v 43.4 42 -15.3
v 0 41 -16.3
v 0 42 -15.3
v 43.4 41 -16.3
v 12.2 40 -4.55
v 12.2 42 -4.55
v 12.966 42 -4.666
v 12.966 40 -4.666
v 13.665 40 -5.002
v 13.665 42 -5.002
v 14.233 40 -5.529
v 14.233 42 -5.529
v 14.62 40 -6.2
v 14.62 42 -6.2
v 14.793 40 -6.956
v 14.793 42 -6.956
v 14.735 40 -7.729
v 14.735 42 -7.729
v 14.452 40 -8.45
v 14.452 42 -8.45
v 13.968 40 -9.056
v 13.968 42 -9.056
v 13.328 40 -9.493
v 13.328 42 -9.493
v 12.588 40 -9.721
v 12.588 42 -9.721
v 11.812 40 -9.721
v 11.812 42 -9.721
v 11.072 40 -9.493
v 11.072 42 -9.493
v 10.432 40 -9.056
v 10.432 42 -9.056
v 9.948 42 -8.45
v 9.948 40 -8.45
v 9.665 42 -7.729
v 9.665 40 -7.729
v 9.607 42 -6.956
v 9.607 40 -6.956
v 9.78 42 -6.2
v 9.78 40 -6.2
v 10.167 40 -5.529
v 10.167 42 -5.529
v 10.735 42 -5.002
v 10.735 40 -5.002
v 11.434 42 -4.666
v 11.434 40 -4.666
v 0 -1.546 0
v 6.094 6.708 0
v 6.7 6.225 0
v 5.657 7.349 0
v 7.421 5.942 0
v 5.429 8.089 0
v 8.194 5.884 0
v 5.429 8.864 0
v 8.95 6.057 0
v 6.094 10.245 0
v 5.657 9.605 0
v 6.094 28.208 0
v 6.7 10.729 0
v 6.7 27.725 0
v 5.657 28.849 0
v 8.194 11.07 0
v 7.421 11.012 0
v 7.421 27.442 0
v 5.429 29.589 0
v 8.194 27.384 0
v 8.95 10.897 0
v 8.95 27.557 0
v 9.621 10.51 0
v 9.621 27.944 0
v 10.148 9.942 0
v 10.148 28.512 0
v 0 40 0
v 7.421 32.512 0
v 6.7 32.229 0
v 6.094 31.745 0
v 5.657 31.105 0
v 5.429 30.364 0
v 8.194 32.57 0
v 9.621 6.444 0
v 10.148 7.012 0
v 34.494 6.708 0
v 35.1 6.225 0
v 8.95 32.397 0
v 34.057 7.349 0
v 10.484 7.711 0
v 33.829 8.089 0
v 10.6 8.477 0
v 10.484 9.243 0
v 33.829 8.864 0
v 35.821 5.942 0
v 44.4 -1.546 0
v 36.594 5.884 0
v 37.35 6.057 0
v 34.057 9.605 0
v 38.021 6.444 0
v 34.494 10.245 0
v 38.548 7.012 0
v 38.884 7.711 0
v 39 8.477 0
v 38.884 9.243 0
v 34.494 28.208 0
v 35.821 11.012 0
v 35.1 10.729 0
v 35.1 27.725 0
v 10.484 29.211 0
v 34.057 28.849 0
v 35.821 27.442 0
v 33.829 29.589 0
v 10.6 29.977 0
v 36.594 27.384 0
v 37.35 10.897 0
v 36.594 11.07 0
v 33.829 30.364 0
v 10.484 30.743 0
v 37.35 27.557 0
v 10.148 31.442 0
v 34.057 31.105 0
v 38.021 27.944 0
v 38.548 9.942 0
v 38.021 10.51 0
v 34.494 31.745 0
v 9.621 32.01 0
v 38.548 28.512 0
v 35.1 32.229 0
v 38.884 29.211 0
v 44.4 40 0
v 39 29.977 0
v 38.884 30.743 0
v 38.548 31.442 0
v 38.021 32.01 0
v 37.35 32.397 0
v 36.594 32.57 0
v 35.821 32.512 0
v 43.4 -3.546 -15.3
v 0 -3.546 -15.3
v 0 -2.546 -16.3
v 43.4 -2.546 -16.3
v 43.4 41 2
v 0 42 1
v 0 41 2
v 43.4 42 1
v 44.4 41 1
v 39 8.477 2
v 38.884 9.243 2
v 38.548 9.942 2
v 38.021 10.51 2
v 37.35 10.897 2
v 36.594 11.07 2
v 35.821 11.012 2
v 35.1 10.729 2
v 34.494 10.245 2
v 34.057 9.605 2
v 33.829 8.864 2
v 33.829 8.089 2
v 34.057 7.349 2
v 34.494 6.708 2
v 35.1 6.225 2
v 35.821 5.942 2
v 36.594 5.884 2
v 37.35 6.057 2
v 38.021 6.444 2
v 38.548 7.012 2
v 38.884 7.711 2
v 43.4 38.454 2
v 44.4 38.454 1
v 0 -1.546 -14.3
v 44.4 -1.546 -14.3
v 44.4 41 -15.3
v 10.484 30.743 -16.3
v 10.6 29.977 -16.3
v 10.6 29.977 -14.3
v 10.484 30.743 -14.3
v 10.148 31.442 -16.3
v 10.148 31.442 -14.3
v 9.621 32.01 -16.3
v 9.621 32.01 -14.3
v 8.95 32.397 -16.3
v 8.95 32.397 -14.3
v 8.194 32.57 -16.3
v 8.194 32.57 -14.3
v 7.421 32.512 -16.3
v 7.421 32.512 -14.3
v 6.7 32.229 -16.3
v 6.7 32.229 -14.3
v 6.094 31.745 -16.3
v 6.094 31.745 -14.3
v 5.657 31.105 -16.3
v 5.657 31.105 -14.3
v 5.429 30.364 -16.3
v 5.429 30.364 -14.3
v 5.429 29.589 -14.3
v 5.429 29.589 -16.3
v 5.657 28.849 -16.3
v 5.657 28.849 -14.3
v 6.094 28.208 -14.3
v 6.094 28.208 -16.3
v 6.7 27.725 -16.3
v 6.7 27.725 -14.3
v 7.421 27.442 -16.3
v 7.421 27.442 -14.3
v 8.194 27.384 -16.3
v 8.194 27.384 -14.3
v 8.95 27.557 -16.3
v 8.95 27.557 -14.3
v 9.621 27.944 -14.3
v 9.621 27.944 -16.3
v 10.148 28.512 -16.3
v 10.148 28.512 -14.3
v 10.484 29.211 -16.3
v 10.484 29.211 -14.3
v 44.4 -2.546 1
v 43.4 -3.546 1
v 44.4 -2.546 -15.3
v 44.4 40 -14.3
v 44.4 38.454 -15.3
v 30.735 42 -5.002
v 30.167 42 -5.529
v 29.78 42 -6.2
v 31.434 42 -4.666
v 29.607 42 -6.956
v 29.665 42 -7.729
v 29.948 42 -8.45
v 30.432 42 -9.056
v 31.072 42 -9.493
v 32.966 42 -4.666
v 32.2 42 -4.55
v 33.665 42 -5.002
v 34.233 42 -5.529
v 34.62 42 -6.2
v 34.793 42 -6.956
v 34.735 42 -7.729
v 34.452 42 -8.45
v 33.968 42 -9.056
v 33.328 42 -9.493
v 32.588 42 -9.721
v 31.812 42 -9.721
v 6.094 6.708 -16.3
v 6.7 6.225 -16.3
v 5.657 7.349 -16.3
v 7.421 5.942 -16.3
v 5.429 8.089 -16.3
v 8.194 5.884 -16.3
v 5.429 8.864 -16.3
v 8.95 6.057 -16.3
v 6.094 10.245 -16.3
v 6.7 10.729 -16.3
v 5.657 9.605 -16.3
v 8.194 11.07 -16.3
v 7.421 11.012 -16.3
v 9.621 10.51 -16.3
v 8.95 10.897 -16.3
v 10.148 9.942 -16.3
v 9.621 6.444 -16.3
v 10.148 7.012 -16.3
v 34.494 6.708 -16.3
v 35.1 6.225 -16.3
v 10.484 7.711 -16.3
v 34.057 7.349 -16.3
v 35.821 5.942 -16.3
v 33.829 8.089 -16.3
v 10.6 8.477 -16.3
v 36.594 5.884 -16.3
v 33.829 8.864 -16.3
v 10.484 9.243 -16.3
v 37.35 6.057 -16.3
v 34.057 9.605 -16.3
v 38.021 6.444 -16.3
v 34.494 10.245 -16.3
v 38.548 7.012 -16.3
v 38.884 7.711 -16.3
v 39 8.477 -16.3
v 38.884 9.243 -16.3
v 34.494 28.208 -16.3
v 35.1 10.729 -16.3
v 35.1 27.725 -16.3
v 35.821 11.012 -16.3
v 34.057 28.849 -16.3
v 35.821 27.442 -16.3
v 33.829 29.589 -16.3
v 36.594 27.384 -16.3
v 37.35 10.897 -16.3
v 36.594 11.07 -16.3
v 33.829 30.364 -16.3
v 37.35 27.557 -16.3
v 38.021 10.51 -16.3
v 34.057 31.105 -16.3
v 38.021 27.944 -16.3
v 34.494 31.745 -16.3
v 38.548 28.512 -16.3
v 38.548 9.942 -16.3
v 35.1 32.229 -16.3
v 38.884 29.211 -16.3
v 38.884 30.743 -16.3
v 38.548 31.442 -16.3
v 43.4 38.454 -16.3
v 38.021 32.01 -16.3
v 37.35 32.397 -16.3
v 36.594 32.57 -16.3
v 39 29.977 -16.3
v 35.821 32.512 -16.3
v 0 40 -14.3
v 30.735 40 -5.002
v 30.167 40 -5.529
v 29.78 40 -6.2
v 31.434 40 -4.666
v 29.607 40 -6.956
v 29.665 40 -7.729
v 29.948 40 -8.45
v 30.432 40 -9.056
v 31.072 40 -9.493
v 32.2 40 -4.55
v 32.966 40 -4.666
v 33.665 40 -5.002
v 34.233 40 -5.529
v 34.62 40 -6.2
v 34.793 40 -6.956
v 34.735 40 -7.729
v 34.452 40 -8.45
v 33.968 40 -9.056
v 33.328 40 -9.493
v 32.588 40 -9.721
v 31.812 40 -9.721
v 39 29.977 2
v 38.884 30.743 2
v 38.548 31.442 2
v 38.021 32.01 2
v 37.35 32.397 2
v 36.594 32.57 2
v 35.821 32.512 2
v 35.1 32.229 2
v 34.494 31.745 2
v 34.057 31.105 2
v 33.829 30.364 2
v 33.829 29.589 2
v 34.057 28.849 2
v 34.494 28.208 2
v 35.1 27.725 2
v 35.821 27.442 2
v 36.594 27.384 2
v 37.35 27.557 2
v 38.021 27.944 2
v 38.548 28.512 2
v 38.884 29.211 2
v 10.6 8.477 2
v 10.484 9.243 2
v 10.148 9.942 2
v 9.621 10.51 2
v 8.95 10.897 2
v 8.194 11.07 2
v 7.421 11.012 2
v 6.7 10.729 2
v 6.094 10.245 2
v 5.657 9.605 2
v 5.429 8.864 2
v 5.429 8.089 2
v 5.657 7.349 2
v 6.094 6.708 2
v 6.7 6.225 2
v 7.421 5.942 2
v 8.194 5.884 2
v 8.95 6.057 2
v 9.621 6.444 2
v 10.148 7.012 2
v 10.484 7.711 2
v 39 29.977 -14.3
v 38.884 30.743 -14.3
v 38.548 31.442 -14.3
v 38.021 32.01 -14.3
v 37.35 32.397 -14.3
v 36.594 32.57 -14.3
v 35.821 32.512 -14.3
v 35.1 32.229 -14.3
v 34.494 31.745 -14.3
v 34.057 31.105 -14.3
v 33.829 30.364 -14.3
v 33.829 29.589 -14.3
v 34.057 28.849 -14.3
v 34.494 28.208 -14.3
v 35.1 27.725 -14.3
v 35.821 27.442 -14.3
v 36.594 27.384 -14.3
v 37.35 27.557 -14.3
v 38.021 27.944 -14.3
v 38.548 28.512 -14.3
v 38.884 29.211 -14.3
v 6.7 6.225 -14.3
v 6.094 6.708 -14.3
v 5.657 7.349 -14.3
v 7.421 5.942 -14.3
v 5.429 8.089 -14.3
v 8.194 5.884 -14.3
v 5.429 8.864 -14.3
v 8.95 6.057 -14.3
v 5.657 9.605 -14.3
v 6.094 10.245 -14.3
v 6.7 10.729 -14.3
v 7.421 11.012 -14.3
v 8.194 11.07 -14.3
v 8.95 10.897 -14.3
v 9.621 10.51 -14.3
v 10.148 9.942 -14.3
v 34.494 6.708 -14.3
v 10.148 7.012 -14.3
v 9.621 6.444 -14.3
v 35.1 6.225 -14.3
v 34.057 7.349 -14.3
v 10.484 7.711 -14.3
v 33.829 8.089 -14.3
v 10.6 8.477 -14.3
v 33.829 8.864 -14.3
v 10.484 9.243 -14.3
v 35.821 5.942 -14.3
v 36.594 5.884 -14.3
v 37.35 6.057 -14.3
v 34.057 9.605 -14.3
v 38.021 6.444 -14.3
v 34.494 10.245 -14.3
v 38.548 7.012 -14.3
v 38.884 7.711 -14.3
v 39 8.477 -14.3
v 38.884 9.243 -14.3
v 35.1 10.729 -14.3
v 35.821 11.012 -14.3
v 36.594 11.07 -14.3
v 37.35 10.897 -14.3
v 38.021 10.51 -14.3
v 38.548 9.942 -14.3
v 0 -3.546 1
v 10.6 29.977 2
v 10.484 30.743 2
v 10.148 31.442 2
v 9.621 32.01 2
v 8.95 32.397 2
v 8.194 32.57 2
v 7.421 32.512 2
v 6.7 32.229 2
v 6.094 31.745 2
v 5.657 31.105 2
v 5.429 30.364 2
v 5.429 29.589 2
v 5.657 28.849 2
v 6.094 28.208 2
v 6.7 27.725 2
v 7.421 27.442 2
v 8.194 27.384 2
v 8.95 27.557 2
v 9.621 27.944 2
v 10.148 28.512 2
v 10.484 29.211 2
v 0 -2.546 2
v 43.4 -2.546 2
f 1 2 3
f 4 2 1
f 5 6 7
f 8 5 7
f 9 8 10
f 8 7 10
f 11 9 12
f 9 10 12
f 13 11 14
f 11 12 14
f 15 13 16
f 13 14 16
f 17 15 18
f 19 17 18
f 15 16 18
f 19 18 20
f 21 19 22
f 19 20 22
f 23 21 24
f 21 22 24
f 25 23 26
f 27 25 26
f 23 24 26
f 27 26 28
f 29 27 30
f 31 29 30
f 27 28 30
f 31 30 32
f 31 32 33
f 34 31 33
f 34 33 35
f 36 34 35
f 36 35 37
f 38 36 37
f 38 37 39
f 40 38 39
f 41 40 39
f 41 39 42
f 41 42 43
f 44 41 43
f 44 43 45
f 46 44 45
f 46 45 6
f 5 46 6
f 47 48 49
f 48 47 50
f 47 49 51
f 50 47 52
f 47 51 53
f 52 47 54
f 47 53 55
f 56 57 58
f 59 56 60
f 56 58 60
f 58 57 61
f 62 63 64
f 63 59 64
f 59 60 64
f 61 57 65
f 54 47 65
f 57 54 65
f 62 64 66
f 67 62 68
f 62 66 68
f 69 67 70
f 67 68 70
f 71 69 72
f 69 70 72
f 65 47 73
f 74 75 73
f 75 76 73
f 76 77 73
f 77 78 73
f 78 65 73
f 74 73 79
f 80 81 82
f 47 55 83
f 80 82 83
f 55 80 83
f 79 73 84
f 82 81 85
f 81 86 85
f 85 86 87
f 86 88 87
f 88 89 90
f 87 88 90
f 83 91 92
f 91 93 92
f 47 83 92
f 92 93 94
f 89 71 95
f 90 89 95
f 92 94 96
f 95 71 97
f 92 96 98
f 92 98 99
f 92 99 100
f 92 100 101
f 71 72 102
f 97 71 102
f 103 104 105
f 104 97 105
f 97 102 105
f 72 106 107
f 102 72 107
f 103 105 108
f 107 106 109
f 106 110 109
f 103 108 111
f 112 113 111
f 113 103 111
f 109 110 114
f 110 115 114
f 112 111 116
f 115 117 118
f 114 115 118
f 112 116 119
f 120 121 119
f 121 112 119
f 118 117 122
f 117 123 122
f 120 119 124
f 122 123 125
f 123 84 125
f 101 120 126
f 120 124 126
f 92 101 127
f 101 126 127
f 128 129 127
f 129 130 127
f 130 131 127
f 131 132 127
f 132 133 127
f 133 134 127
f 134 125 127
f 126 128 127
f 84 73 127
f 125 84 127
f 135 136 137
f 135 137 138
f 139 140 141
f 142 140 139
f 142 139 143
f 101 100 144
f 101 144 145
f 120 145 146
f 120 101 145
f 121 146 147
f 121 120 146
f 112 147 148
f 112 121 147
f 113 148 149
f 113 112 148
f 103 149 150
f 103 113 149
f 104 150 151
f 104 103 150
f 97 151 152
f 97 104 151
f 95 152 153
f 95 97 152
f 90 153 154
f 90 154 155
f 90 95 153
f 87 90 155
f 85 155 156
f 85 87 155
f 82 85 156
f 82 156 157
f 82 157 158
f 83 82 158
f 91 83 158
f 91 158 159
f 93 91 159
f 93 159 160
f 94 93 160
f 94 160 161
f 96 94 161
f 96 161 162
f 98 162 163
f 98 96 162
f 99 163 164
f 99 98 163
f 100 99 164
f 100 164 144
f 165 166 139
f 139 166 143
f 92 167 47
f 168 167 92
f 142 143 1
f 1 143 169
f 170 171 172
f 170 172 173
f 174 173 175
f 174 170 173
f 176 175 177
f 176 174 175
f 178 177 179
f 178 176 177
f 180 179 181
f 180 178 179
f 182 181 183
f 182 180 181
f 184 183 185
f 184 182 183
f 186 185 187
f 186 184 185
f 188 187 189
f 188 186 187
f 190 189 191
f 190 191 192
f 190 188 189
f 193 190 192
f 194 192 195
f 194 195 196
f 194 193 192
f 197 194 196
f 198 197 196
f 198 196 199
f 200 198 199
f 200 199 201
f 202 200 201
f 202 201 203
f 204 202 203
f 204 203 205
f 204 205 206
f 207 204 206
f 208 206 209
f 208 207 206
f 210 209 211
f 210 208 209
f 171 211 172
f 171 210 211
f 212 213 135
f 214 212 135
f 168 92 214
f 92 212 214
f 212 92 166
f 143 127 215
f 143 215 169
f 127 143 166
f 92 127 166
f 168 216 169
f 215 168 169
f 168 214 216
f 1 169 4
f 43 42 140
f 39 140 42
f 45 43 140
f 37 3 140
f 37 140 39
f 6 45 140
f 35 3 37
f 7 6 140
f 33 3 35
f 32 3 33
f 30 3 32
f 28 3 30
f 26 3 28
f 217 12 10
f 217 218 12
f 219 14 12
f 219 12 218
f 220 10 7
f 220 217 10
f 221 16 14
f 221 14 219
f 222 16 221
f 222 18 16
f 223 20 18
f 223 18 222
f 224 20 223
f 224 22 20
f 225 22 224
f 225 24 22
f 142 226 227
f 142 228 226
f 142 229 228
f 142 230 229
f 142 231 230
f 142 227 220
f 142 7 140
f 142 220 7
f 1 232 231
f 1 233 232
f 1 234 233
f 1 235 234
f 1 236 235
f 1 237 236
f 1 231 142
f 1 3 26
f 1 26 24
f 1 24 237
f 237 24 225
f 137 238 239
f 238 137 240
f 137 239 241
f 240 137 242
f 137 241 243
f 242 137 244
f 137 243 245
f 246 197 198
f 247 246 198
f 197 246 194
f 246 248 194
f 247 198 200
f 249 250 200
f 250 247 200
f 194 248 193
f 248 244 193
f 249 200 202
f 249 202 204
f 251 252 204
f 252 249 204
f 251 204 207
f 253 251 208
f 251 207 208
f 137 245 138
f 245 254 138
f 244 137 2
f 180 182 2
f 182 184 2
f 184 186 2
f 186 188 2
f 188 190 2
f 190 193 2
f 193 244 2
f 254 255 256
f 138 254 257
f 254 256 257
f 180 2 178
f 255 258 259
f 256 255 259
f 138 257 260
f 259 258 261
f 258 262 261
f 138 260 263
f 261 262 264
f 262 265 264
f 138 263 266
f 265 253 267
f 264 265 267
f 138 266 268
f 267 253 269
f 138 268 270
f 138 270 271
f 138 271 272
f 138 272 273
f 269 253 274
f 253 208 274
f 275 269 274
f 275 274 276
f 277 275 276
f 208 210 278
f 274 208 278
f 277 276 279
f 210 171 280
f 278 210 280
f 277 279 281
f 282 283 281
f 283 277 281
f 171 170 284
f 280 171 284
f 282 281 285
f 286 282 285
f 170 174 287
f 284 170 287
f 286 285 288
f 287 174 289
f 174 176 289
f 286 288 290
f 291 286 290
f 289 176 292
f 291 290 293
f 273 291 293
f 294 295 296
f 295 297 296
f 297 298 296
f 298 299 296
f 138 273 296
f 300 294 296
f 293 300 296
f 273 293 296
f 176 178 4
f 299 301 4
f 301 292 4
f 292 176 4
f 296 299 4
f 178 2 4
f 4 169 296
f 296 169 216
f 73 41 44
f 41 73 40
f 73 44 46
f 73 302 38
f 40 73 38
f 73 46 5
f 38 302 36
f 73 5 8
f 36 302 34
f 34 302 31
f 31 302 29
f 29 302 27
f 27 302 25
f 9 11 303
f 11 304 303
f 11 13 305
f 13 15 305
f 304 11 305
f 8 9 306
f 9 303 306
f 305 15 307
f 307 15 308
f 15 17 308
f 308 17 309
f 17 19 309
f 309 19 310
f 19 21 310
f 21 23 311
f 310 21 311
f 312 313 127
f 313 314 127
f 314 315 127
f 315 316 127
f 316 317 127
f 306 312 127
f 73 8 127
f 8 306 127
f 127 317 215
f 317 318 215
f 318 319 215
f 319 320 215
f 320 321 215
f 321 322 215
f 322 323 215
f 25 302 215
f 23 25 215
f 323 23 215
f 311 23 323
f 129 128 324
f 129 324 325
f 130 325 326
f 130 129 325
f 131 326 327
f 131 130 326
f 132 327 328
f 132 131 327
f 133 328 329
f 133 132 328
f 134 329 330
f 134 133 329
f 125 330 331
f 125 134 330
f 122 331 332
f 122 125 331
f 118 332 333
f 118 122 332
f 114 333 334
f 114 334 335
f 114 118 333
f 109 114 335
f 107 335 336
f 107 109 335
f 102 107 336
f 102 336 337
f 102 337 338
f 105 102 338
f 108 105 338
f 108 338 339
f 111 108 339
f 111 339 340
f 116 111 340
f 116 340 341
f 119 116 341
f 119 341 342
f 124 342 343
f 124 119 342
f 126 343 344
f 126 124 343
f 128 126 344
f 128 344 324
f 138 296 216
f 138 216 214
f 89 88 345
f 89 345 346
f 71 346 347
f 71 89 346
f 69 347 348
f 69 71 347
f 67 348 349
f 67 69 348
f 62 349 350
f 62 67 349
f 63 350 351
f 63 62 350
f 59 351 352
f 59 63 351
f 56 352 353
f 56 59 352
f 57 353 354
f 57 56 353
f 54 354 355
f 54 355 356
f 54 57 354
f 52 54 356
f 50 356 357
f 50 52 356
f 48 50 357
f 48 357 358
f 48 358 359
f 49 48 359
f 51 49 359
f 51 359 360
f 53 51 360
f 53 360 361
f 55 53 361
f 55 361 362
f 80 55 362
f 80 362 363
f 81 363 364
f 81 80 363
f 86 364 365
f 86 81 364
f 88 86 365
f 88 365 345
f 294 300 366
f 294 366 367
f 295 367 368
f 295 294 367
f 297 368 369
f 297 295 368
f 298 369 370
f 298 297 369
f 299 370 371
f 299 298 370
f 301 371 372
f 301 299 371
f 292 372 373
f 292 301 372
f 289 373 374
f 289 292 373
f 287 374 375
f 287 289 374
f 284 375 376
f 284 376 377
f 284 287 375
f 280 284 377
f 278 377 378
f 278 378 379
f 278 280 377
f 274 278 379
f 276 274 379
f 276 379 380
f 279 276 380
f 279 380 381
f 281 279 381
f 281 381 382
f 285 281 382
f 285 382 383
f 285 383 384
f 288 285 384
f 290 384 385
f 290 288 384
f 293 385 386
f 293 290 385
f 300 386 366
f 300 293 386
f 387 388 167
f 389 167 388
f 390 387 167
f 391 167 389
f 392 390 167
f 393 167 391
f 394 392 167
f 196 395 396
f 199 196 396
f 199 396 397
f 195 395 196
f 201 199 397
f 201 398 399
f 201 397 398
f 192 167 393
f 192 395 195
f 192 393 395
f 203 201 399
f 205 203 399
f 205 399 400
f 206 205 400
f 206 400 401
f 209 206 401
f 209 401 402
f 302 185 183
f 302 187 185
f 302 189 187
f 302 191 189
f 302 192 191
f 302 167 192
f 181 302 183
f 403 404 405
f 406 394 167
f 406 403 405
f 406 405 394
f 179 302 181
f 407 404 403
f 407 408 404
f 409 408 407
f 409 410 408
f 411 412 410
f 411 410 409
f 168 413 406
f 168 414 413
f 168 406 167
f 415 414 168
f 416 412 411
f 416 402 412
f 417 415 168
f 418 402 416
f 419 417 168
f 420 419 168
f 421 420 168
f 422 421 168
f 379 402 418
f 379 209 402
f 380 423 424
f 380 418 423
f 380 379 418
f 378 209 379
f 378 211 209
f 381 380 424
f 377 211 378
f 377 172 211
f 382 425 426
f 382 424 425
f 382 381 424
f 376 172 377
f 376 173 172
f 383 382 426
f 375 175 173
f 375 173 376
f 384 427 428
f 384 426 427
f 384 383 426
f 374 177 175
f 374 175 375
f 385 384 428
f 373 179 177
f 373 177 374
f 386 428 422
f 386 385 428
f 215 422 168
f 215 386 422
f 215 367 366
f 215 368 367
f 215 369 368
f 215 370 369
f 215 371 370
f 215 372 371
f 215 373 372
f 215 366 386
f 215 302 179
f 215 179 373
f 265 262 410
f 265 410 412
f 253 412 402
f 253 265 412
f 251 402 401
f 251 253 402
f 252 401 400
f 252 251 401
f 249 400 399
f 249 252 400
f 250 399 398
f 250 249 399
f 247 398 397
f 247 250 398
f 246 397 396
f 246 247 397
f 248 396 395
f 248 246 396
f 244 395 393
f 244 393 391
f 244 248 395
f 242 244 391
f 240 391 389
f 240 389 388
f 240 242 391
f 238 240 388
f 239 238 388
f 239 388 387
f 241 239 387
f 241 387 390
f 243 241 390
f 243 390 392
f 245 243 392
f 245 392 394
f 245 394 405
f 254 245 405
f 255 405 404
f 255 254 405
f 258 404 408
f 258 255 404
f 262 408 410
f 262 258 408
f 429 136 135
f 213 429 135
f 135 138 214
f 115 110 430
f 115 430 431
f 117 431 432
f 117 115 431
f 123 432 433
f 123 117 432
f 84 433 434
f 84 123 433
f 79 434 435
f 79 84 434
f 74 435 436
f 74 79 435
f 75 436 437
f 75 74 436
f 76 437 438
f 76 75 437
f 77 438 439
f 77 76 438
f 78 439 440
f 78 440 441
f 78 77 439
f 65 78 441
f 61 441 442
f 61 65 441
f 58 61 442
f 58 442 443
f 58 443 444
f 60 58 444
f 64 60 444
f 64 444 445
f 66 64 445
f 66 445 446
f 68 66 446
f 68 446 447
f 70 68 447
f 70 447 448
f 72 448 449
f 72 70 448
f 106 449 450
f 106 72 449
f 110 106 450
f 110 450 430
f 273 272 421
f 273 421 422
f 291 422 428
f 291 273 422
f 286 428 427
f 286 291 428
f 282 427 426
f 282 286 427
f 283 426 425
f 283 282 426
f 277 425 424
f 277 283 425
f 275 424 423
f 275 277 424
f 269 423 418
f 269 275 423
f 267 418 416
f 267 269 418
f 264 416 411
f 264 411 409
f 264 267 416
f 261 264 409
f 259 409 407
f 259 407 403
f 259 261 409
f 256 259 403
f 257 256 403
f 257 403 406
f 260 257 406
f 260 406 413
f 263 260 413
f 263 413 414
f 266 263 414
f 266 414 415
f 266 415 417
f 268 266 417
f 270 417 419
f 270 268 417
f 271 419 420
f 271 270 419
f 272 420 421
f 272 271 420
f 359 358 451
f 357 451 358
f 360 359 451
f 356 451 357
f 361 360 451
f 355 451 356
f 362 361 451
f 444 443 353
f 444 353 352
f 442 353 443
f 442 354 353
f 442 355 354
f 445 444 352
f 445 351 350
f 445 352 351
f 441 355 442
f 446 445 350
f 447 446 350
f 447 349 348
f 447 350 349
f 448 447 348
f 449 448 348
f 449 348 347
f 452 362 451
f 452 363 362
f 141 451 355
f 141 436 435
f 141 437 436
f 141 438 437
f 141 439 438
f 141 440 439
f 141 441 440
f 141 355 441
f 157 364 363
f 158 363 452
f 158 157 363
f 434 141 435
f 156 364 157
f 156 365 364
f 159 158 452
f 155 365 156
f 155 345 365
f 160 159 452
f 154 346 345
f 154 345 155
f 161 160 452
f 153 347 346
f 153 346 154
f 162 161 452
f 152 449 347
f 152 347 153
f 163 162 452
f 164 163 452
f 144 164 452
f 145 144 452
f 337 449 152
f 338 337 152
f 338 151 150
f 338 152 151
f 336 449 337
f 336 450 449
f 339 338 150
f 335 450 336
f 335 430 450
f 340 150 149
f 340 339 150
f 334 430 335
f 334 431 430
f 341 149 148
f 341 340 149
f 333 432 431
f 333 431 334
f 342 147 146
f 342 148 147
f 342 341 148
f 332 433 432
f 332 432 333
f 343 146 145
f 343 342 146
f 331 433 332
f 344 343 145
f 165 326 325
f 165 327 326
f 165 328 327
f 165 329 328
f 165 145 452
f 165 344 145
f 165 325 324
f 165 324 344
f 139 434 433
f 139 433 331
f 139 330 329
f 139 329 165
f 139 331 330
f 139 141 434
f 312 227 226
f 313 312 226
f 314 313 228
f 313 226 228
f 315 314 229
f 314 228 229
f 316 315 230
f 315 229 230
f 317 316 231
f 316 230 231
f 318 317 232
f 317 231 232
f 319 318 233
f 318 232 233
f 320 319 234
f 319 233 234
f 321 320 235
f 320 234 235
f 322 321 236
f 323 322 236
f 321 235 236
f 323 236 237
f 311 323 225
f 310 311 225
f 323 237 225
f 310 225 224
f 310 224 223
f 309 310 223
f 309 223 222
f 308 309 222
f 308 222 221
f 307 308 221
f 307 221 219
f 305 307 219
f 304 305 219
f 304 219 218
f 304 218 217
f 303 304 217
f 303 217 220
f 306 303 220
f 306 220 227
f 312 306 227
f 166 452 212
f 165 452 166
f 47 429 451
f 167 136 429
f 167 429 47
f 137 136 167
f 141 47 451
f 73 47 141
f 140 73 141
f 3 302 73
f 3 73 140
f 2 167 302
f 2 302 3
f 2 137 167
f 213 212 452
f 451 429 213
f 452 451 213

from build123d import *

# Parameters (mm, degrees)
SKETCH1_W               = 44.4
SKETCH1_H               = 40
SKETCH1_R               = 2.6
BOSS_EXTRUDE1_DEPTH     = 2
SKETCH2_W               = 44.4
SKETCH2_H               = 18.3
BOSS_EXTRUDE2_DEPTH     = 2
LPATTERN1_COUNT         = 2
LPATTERN1_PITCH         = 16.3
SKETCH3_R               = 2.6
CUT_EXTRUDE1_DEPTH      = 64.253853638
CHAMFER1_SIZE           = 1
MIRROR1_COPY_1_SKETCH_W = 44.4
MIRROR1_COPY_1_SKETCH_H = 40
MIRROR1_COPY_1_SKETCH_R = 2.6
MIRROR1_COPY_1_DEPTH    = 2
CHAMFER3_SIZE           = 1


with BuildPart() as part:
    # Sketch1 → Boss-Extrude1 (new body)
    with BuildSketch(Plane.XY):
        with Locations((22.2, 20)):
            Rectangle(SKETCH1_W, SKETCH1_H)
        with Locations((8, 8.476902454)):
            Circle(SKETCH1_R, mode=Mode.SUBTRACT)
        with Locations((8, 29.976902454)):
            Circle(SKETCH1_R, mode=Mode.SUBTRACT)
        with Locations((36.4, 29.976902454)):
            Circle(SKETCH1_R, mode=Mode.SUBTRACT)
        with Locations((36.4, 8.476902454)):
            Circle(SKETCH1_R, mode=Mode.SUBTRACT)
    boss_extrude1 = extrude(amount=BOSS_EXTRUDE1_DEPTH)

    # Sketch2 → Boss-Extrude2 (add)
    with BuildSketch(Plane(origin=(0, 40, 0), x_dir=(1, 0, 0), z_dir=(0, 1, 0))):
        with Locations((22.2, 7.15)):
            Rectangle(SKETCH2_W, SKETCH2_H)
    boss_extrude2 = extrude(amount=BOSS_EXTRUDE2_DEPTH)

    # LPattern1: Boss-Extrude1 ×2
    with Locations(*[(0, 0, -i * LPATTERN1_PITCH) for i in range(1, LPATTERN1_COUNT)]):
        add(boss_extrude1)

    # Sketch3 → Cut-Extrude1 (cut, through all)
    with BuildSketch(Plane(origin=(0, 42, 0), x_dir=(1, 0, 0), z_dir=(0, 1, 0))):
        with Locations(Location((12.2, 7.15, 0), (0, 0, 270))):
            Circle(SKETCH3_R)
        with Locations(Location((32.2, 7.15, 0), (0, 0, 270))):
            Circle(SKETCH3_R)
    extrude(amount=-CUT_EXTRUDE1_DEPTH, mode=Mode.SUBTRACT)

    # Chamfer1
    chamfer1_edges = [part.edges().sort_by_distance(p)[0] for p in [
        (44.4, 21, 2),
        (44.4, 21, -16.3),
        (22.2, 42, 2),
        (44.4, 42, -7.15),
        (22.2, 42, -16.3),
        (22.2, 0, -16.3),
        (0, 0, -15.3),
        (44.4, 0, -15.3),
        (44.4, 0, 1),
        (0, 0, 1),
        (22.2, 0, 2),
    ]]
    chamfer(chamfer1_edges, length=CHAMFER1_SIZE)

    # Mirror1: Boss-Extrude1, Boss-Extrude2 across plane
    add(boss_extrude1.mirror(Plane.ZX.offset(19.226902454)))
    add(boss_extrude2.mirror(Plane.ZX.offset(19.226902454)))

    # Mirror1 copy 1 sketch → Mirror1 copy 1 (add)
    with BuildSketch(Plane(origin=(0, 38.453804908, -16.3), x_dir=(1, 0, 0), z_dir=(0, 0, 1))):
        with Locations((22.2, -20)):
            Rectangle(MIRROR1_COPY_1_SKETCH_W, MIRROR1_COPY_1_SKETCH_H)
        with Locations((8, -8.476902454)):
            Circle(MIRROR1_COPY_1_SKETCH_R, mode=Mode.SUBTRACT)
        with Locations((8, -29.976902454)):
            Circle(MIRROR1_COPY_1_SKETCH_R, mode=Mode.SUBTRACT)
        with Locations((36.4, -29.976902454)):
            Circle(MIRROR1_COPY_1_SKETCH_R, mode=Mode.SUBTRACT)
        with Locations((36.4, -8.476902454)):
            Circle(MIRROR1_COPY_1_SKETCH_R, mode=Mode.SUBTRACT)
    extrude(amount=MIRROR1_COPY_1_DEPTH)

    # Chamfer3
    chamfer3_edges = [part.edges().sort_by_distance(p)[0] for p in [
        (44.4, 17.453804908, 2),
        (44.4, 17.453804908, -16.3),
        (22.2, -3.546195092, -16.3),
        (44.4, -3.546195092, -7.15),
        (22.2, -3.546195092, 2),
    ]]
    chamfer(chamfer3_edges, length=CHAMFER3_SIZE - 0.0001)  # a hair under: the kernel refuses the full size


solid = part.part
